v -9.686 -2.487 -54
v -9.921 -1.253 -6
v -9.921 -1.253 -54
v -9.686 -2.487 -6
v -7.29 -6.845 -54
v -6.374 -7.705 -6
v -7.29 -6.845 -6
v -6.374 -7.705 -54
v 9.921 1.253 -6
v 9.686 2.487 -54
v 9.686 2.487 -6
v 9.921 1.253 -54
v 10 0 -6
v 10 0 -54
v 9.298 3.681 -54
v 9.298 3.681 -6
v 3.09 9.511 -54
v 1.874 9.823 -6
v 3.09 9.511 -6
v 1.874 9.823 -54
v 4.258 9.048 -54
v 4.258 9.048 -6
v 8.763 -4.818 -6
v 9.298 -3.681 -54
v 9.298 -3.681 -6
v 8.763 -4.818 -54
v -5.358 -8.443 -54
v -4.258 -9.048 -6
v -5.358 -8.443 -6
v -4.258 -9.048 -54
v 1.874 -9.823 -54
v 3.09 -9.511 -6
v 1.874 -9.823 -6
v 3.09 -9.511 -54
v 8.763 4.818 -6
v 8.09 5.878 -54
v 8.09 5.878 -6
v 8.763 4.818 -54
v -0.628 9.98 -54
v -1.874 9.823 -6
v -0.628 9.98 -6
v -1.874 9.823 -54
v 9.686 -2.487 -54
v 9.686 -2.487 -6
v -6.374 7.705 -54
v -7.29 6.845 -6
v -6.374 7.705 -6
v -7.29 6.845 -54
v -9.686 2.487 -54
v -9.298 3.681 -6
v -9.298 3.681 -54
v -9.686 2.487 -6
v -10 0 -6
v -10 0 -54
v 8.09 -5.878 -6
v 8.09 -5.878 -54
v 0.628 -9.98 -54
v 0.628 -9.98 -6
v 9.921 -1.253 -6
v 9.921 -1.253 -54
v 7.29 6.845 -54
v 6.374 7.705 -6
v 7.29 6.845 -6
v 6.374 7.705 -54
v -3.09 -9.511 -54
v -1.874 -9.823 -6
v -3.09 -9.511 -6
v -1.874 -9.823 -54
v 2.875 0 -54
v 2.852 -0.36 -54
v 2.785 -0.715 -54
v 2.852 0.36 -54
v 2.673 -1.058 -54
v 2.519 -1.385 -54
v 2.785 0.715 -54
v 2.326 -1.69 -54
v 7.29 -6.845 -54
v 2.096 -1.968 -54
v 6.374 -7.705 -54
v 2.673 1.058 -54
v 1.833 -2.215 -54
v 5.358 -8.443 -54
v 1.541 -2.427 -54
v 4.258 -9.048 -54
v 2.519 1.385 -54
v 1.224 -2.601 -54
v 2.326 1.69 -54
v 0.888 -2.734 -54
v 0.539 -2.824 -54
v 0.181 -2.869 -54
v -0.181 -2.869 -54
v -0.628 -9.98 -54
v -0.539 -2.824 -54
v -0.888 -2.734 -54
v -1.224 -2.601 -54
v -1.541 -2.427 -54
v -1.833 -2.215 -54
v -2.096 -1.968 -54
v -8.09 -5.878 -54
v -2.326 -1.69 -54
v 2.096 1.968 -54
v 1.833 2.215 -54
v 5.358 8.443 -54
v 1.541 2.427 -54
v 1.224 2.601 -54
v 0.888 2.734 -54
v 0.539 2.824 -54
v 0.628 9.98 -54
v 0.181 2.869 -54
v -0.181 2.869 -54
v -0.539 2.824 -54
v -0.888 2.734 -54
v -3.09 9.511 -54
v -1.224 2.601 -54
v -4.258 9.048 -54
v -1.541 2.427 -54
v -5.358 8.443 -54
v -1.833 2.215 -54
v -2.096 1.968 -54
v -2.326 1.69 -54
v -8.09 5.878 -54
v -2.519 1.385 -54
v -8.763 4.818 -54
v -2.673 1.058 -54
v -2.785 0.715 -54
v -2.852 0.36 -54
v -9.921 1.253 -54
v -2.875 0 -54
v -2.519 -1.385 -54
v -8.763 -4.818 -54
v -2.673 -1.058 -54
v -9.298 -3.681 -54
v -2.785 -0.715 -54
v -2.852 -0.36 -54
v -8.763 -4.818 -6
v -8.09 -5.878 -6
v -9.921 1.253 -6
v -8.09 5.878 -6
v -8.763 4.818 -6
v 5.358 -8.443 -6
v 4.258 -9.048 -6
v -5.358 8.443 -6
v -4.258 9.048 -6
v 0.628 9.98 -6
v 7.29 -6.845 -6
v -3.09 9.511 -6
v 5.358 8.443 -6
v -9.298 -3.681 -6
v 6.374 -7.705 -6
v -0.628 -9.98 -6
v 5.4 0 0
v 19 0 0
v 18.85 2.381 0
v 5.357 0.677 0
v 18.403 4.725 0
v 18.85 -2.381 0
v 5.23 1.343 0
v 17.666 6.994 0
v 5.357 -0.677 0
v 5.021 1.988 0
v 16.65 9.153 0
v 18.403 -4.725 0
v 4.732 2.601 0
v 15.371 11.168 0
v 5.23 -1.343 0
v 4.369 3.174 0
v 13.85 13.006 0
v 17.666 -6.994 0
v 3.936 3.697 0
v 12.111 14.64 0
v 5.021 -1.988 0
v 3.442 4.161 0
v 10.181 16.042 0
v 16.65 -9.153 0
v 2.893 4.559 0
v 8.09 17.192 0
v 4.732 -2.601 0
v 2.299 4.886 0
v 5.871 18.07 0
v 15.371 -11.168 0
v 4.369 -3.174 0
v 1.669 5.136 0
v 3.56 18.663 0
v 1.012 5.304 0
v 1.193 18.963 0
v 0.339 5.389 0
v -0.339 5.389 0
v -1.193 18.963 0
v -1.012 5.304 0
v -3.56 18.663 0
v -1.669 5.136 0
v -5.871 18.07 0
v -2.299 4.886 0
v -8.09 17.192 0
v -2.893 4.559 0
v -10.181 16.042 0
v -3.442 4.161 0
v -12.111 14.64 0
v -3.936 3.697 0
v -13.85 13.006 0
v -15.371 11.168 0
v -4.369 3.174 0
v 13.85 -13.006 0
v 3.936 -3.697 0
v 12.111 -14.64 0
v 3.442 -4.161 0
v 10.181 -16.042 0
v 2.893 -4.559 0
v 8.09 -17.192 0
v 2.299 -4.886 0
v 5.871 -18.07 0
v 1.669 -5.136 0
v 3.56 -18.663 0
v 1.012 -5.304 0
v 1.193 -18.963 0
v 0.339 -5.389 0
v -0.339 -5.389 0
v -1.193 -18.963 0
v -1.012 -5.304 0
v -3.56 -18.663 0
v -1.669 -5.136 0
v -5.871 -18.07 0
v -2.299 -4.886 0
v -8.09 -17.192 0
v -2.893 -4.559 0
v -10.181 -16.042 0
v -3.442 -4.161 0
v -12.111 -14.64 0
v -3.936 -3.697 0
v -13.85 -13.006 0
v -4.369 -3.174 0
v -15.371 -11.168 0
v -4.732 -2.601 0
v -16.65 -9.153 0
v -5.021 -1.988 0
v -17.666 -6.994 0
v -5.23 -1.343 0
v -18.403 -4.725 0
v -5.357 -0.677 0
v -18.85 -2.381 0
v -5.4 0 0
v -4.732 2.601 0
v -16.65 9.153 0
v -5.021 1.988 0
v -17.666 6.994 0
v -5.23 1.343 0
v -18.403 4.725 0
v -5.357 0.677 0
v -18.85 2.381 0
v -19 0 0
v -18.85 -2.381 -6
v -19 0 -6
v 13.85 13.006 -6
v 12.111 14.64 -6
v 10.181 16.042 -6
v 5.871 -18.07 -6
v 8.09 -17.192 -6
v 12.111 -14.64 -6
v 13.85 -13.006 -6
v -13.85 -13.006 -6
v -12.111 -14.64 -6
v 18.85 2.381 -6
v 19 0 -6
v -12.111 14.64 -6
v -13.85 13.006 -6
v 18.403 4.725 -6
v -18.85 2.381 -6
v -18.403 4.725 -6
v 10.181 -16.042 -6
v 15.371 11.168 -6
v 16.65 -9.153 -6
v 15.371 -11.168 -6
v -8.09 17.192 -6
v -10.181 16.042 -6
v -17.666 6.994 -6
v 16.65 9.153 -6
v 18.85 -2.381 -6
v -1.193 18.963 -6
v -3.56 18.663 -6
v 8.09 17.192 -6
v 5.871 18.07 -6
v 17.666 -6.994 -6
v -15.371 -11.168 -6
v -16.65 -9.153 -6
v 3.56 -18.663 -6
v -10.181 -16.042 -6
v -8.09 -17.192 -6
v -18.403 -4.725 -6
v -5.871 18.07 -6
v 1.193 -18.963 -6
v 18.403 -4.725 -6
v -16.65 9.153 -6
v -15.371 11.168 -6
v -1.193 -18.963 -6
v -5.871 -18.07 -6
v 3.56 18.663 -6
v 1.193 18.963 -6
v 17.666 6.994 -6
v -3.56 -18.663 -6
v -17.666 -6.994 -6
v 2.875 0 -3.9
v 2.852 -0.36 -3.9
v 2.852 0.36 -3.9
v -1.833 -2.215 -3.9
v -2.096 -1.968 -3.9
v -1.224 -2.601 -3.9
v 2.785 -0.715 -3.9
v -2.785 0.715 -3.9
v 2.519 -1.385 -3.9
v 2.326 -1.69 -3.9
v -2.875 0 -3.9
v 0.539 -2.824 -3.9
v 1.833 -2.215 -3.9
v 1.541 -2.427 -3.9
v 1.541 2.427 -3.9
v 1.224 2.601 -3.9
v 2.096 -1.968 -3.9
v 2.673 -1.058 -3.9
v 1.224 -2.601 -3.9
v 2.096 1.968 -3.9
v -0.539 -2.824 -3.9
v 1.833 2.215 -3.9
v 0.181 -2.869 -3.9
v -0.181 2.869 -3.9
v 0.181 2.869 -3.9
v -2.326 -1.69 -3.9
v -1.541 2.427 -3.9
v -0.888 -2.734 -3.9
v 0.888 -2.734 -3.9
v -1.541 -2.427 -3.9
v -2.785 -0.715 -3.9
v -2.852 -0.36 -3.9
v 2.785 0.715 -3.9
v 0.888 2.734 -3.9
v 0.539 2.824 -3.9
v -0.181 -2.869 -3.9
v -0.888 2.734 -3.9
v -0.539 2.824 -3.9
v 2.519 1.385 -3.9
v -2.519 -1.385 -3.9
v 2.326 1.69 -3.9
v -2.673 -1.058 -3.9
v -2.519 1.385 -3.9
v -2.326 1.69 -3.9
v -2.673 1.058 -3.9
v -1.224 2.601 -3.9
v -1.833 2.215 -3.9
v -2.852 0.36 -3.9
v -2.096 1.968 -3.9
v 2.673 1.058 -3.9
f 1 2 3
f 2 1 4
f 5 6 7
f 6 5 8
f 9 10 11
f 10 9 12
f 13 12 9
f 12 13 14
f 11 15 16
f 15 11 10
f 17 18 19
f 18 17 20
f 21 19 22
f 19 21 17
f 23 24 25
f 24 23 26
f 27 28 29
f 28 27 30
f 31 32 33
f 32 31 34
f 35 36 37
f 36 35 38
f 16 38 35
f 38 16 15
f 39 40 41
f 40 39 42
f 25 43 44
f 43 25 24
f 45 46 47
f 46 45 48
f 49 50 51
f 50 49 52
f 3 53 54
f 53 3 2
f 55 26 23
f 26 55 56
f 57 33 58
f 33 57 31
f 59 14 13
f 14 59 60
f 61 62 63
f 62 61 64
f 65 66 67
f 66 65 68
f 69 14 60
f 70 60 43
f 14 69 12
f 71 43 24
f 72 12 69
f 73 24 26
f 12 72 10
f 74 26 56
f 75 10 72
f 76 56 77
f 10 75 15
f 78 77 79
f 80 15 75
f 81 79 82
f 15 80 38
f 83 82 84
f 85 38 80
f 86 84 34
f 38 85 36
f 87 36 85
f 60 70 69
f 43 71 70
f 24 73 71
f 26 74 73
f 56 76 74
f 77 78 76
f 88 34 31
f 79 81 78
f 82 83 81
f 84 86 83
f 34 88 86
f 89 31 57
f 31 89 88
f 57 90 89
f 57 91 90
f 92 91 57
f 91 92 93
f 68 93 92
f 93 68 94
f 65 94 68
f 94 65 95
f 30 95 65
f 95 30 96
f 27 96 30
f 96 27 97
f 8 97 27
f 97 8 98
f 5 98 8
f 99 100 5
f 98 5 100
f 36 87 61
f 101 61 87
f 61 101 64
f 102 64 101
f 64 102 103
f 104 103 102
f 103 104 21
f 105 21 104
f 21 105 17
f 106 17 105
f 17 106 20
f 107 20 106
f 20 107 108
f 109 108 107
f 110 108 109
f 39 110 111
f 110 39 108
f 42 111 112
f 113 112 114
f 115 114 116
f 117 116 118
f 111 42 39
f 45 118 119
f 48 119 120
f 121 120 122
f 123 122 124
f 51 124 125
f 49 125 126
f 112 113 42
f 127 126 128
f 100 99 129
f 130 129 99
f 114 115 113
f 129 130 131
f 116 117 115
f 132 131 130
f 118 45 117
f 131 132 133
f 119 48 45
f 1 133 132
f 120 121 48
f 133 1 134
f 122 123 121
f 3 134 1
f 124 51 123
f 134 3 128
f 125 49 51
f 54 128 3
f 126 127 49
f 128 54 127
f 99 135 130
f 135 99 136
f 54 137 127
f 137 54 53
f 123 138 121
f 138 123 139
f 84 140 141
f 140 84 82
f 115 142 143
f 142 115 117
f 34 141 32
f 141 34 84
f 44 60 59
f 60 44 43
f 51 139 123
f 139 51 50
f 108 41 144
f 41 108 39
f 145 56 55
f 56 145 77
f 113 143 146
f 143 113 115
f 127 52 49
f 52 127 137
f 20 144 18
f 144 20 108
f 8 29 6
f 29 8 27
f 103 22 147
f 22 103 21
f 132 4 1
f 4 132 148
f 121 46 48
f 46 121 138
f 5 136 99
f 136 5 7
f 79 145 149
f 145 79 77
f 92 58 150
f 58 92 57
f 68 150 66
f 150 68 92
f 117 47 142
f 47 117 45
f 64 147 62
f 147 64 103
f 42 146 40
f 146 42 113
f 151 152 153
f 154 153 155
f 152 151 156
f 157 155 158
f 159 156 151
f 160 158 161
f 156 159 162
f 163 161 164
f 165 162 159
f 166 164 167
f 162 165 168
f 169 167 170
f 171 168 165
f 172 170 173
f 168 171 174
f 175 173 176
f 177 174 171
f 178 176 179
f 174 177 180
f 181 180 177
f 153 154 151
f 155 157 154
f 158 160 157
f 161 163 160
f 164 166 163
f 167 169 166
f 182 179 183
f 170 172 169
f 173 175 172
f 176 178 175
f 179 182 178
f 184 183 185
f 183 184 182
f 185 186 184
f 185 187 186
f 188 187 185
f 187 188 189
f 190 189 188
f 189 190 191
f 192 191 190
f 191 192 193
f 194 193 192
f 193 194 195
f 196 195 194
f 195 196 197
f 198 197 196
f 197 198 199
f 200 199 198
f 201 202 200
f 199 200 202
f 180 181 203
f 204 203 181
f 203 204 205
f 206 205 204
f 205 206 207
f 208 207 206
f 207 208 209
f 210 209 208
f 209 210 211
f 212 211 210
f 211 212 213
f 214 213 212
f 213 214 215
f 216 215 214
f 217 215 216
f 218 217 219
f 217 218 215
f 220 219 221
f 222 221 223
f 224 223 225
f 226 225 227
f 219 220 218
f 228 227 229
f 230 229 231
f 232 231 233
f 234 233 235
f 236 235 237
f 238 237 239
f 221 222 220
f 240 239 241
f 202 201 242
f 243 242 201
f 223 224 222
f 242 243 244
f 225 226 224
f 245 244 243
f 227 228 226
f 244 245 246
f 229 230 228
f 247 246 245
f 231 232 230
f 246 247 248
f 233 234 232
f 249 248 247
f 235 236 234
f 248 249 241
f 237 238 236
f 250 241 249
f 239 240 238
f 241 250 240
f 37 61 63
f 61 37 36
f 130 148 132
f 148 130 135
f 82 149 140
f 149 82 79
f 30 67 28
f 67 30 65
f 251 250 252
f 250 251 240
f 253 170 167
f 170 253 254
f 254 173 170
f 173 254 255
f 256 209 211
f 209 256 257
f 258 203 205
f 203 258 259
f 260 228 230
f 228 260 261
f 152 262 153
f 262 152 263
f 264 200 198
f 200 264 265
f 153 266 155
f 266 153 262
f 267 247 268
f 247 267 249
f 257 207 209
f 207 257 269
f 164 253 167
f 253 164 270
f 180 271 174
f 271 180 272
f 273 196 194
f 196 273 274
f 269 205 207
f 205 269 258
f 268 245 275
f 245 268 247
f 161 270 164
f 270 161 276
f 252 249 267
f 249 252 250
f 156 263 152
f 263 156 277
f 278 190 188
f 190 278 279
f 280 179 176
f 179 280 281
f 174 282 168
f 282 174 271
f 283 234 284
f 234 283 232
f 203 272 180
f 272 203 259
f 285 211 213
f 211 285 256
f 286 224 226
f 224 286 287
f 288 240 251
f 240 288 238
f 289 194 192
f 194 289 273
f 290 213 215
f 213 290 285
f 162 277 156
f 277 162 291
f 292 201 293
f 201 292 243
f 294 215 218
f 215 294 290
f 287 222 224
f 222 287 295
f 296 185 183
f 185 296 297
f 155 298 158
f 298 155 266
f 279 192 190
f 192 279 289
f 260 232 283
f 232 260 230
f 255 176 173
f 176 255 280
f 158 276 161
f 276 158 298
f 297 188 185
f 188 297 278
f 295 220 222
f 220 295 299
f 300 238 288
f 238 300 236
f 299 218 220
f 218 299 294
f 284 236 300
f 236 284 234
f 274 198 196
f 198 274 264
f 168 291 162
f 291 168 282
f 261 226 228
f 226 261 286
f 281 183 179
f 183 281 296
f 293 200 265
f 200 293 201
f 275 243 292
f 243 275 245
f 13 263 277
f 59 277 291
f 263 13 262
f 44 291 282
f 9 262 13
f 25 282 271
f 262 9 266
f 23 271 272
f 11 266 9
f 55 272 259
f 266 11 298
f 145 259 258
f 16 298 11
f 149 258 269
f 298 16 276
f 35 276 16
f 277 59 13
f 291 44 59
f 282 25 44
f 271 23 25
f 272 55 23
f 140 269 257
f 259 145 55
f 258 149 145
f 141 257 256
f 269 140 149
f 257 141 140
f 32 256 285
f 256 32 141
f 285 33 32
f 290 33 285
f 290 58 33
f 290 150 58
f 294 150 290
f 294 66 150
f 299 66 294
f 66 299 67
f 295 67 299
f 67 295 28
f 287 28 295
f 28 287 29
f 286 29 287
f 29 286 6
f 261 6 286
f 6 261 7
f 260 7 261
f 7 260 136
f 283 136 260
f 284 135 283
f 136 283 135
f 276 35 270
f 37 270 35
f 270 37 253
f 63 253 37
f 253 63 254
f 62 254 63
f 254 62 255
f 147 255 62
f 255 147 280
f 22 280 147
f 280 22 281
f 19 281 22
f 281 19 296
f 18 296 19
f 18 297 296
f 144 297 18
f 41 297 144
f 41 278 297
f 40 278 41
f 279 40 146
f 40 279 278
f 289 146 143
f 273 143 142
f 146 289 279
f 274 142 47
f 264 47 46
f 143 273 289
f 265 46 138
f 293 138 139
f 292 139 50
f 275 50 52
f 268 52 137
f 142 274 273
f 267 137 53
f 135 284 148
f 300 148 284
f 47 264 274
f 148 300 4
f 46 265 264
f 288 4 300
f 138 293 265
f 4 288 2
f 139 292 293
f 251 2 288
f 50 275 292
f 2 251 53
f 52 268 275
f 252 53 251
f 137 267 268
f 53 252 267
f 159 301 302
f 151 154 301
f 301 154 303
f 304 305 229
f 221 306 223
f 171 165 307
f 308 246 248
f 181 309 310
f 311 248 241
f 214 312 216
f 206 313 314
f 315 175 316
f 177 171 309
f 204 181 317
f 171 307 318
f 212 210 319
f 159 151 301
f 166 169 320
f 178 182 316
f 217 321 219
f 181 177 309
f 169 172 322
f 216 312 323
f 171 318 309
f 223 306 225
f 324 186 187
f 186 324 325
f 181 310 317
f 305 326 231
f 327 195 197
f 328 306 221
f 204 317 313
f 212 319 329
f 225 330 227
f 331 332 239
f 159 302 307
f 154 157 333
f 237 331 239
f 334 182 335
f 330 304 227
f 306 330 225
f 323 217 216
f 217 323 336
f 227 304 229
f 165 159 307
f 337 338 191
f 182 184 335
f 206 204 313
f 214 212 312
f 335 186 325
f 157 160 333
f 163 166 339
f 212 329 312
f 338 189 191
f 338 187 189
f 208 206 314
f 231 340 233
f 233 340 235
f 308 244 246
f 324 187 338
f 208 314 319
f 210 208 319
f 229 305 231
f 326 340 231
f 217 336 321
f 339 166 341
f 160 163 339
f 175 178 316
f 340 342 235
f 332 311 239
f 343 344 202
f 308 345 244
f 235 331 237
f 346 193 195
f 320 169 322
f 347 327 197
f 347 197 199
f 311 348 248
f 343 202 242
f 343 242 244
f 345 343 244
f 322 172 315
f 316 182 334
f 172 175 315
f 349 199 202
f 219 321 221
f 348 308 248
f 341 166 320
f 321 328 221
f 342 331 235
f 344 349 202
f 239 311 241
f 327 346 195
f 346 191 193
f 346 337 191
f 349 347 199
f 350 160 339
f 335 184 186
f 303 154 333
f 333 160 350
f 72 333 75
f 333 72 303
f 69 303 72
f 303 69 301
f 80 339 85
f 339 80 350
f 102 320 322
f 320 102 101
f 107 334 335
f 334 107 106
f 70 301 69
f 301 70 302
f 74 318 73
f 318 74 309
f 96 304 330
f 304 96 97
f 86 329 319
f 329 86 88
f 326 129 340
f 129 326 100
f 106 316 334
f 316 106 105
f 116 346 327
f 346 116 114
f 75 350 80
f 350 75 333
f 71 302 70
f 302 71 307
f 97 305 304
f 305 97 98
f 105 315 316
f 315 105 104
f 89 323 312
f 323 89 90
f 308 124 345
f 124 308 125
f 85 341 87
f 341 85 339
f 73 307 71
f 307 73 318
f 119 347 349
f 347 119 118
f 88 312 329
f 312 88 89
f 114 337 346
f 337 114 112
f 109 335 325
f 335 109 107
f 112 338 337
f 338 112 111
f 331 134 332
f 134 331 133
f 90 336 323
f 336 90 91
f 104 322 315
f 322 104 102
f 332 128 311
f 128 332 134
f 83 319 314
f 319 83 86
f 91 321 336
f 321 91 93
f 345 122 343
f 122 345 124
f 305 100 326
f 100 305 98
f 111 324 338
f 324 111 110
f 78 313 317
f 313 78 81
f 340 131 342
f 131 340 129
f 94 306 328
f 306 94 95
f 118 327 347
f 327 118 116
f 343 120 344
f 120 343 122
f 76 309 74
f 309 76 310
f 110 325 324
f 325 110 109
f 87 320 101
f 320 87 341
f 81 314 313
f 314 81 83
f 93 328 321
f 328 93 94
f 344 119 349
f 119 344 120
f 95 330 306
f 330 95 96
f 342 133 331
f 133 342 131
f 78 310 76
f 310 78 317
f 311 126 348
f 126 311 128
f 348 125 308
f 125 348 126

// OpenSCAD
$fn = 50;


difference() {
	union() {
		translate(v = [0, 0, -54.0000000000]) {
			cylinder(h = 54, r = 10.0000000000);
		}
		translate(v = [0, 0, -6.0000000000]) {
			cylinder(h = 6, r = 19.0000000000);
		}
	}
	union() {
		translate(v = [0, 0, 0]) {
			rotate(a = [0, 0, 0]) {
				difference() {
					union() {
						#translate(v = [0, 0, -54.0000000000]) {
							cylinder(h = 54, r = 2.6000000000);
						}
						#translate(v = [0, 0, -3.9000000000]) {
							cylinder(h = 3.9000000000, r1 = 2.8750000000, r2 = 5.4000000000);
						}
						#translate(v = [0, 0, -54.0000000000]) {
							cylinder(h = 54, r = 2.8750000000);
						}
						#translate(v = [0, 0, -54.0000000000]) {
							cylinder(h = 54, r = 2.6000000000);
						}
					}
					union();
				}
			}
		}
	}
}
